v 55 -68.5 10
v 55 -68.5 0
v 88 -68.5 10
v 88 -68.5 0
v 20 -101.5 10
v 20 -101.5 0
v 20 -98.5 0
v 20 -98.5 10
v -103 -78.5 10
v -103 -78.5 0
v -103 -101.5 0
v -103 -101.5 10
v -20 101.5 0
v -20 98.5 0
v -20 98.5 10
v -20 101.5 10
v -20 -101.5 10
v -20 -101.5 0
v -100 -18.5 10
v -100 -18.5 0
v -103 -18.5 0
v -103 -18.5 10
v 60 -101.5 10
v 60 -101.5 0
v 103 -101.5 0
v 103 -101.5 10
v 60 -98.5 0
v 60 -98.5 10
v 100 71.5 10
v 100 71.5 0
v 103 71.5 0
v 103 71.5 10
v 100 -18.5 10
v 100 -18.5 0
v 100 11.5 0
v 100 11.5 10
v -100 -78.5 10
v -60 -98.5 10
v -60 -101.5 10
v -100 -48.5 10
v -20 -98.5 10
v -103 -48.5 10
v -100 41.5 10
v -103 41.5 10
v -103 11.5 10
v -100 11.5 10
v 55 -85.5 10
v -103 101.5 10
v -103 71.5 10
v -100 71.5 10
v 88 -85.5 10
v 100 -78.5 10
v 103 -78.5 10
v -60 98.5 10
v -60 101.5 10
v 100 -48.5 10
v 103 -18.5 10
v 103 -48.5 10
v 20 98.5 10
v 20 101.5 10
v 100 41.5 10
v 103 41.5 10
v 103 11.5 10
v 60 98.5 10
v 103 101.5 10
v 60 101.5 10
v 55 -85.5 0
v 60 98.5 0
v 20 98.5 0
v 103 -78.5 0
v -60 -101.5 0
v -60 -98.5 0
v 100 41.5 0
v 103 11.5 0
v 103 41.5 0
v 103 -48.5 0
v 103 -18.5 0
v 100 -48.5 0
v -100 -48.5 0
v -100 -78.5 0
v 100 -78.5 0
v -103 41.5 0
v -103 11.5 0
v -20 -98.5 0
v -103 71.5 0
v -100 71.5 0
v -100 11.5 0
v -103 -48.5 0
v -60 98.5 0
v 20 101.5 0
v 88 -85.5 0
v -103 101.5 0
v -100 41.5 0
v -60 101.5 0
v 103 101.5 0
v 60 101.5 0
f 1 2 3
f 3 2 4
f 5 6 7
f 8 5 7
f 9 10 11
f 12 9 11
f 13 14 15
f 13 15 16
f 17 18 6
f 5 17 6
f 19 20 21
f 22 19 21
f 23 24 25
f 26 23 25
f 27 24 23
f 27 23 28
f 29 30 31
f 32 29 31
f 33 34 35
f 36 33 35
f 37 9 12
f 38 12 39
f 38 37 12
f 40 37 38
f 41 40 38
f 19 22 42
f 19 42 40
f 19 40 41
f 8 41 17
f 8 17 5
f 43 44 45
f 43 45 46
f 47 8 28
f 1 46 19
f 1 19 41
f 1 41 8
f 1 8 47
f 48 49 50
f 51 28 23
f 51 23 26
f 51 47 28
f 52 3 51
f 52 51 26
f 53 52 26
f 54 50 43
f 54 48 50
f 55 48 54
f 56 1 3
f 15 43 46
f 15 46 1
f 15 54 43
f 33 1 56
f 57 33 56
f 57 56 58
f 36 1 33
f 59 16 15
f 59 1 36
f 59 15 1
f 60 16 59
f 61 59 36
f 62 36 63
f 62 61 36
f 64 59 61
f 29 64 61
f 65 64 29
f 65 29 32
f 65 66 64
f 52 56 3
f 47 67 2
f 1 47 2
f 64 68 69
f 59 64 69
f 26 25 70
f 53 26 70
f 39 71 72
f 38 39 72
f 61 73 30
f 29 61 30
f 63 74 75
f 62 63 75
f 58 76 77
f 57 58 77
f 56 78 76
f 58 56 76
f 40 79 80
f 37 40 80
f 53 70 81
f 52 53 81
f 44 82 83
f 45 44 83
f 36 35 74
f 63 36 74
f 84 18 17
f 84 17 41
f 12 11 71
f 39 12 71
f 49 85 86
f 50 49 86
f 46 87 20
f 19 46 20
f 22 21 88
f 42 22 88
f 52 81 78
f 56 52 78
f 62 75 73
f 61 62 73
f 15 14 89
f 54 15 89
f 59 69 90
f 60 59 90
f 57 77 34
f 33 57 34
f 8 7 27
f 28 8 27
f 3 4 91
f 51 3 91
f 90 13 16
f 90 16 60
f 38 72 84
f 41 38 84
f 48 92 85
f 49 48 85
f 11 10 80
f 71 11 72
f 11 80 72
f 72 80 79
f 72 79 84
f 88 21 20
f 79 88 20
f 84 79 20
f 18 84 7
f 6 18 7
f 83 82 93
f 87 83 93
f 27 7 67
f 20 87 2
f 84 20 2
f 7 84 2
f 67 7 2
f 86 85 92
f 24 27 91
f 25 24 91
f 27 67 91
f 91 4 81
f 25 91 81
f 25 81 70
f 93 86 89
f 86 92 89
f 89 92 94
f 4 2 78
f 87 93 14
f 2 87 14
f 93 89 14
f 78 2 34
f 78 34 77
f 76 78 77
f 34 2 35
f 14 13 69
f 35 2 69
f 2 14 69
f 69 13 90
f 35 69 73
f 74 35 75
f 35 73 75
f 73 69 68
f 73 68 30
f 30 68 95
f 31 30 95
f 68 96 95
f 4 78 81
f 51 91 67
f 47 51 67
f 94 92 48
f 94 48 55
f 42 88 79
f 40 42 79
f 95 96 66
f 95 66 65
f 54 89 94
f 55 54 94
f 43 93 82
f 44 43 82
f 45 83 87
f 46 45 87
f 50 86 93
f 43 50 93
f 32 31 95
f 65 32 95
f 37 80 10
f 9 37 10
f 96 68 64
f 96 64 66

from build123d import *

# Parameters (mm, degrees)
SKETCH1_W           = 40
SKETCH1_H           = 3
SKETCH1_W_2         = 43
BOSS_EXTRUDE1_DEPTH = 10


with BuildPart() as part:
    # Sketch1 → Boss-Extrude1 (new body)
    with BuildSketch(Plane.XY):
        with Locations((0, 100)):
            Rectangle(SKETCH1_W, SKETCH1_H)
        with Locations((-81.5, 100)):
            Rectangle(SKETCH1_W_2, SKETCH1_H)
        with Locations((81.5, 100)):
            Rectangle(SKETCH1_W_2, SKETCH1_H)
        with Locations((81.5, -100)):
            Rectangle(SKETCH1_W_2, SKETCH1_H)
        with Locations((0, -100)):
            Rectangle(SKETCH1_W, SKETCH1_H)
        with Locations((-81.5, -100)):
            Rectangle(SKETCH1_W_2, SKETCH1_H)
        Polygon((88, -84.155339806), (103, -98.5), (103, -78.5), (100, -78.5), (100, -48.5), (103, -48.5), (103, -18.5), (100, -18.5), (100, 11.5), (103, 11.5), (103, 41.5), (100, 41.5), (100, 71.5), (103, 71.5), (103, 98.5), (60, 98.5), (20, 98.5), (-20, 98.5), (-60, 98.5), (-103, 98.5), (71.629441624, -68.5), (88, -68.5), align=None)
        Polygon((-103, -78.5), (-103, -98.5), (-60, -98.5), (-20, -98.5), (20, -98.5), (60, -98.5), (103, -98.5), (88, -84.155339806), (88, -85.5), (55, -85.5), (55, -68.5), (71.629441624, -68.5), (-103, 98.5), (-103, 71.5), (-100, 71.5), (-100, 41.5), (-103, 41.5), (-103, 11.5), (-100, 11.5), (-100, -18.5), (-103, -18.5), (-103, -48.5), (-100, -48.5), (-100, -78.5), align=None)
    extrude(amount=BOSS_EXTRUDE1_DEPTH)


solid = part.part
